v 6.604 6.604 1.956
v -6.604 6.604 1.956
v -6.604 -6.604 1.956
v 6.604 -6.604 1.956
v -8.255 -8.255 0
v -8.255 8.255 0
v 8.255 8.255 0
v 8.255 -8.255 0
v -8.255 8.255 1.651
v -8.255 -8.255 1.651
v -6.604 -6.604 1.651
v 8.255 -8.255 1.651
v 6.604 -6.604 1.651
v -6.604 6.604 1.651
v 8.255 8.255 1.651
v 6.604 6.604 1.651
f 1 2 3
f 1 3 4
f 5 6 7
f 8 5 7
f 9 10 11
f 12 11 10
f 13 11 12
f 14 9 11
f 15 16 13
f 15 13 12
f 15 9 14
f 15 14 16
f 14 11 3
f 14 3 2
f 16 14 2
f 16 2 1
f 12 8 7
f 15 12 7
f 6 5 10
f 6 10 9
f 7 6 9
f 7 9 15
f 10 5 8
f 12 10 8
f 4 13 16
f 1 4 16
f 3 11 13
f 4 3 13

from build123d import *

# Parameters (mm, degrees)
F0_W     = 16.51
F0_H     = 16.51
F0_W_2   = 13.208
F0_H_2   = 13.208
F1_DEPTH = 1.651
F0_W_3   = 10
F0_H_3   = 10
F2_DEPTH = 0.5588
F3_DEPTH = 1.397
F4_DEPTH = 1.524


with BuildPart() as f1:
    # F0 (on Top) → F1 (new body)
    with BuildSketch(Plane.XY):
        Rectangle(F0_W, F0_H)
        Rectangle(F0_W_2, F0_H_2, mode=Mode.SUBTRACT)
    extrude(amount=F1_DEPTH)

    # F0 (on Top) → F2 (join)
    with BuildSketch(Plane.XY):
        Rectangle(F0_W, F0_H)
        Rectangle(F0_W_2, F0_H_2, mode=Mode.SUBTRACT)
        Rectangle(F0_W_2, F0_H_2)
        Rectangle(F0_W_3, F0_H_3, mode=Mode.SUBTRACT)
        Rectangle(F0_W_3, F0_H_3)
    extrude(amount=F2_DEPTH)

    # F3 (add): a face of the model
    f3_faces = [f1.faces().sort_by_distance(p)[0] for p in [
        (0, 0, 0.5588),
    ]]
    extrude(f3_faces, amount=F3_DEPTH)

    # F0 (on Top) → F4 (join)
    with BuildSketch(Plane.XY):
        Rectangle(F0_W_3, F0_H_3)
    extrude(amount=F4_DEPTH)


solid = f1.part
